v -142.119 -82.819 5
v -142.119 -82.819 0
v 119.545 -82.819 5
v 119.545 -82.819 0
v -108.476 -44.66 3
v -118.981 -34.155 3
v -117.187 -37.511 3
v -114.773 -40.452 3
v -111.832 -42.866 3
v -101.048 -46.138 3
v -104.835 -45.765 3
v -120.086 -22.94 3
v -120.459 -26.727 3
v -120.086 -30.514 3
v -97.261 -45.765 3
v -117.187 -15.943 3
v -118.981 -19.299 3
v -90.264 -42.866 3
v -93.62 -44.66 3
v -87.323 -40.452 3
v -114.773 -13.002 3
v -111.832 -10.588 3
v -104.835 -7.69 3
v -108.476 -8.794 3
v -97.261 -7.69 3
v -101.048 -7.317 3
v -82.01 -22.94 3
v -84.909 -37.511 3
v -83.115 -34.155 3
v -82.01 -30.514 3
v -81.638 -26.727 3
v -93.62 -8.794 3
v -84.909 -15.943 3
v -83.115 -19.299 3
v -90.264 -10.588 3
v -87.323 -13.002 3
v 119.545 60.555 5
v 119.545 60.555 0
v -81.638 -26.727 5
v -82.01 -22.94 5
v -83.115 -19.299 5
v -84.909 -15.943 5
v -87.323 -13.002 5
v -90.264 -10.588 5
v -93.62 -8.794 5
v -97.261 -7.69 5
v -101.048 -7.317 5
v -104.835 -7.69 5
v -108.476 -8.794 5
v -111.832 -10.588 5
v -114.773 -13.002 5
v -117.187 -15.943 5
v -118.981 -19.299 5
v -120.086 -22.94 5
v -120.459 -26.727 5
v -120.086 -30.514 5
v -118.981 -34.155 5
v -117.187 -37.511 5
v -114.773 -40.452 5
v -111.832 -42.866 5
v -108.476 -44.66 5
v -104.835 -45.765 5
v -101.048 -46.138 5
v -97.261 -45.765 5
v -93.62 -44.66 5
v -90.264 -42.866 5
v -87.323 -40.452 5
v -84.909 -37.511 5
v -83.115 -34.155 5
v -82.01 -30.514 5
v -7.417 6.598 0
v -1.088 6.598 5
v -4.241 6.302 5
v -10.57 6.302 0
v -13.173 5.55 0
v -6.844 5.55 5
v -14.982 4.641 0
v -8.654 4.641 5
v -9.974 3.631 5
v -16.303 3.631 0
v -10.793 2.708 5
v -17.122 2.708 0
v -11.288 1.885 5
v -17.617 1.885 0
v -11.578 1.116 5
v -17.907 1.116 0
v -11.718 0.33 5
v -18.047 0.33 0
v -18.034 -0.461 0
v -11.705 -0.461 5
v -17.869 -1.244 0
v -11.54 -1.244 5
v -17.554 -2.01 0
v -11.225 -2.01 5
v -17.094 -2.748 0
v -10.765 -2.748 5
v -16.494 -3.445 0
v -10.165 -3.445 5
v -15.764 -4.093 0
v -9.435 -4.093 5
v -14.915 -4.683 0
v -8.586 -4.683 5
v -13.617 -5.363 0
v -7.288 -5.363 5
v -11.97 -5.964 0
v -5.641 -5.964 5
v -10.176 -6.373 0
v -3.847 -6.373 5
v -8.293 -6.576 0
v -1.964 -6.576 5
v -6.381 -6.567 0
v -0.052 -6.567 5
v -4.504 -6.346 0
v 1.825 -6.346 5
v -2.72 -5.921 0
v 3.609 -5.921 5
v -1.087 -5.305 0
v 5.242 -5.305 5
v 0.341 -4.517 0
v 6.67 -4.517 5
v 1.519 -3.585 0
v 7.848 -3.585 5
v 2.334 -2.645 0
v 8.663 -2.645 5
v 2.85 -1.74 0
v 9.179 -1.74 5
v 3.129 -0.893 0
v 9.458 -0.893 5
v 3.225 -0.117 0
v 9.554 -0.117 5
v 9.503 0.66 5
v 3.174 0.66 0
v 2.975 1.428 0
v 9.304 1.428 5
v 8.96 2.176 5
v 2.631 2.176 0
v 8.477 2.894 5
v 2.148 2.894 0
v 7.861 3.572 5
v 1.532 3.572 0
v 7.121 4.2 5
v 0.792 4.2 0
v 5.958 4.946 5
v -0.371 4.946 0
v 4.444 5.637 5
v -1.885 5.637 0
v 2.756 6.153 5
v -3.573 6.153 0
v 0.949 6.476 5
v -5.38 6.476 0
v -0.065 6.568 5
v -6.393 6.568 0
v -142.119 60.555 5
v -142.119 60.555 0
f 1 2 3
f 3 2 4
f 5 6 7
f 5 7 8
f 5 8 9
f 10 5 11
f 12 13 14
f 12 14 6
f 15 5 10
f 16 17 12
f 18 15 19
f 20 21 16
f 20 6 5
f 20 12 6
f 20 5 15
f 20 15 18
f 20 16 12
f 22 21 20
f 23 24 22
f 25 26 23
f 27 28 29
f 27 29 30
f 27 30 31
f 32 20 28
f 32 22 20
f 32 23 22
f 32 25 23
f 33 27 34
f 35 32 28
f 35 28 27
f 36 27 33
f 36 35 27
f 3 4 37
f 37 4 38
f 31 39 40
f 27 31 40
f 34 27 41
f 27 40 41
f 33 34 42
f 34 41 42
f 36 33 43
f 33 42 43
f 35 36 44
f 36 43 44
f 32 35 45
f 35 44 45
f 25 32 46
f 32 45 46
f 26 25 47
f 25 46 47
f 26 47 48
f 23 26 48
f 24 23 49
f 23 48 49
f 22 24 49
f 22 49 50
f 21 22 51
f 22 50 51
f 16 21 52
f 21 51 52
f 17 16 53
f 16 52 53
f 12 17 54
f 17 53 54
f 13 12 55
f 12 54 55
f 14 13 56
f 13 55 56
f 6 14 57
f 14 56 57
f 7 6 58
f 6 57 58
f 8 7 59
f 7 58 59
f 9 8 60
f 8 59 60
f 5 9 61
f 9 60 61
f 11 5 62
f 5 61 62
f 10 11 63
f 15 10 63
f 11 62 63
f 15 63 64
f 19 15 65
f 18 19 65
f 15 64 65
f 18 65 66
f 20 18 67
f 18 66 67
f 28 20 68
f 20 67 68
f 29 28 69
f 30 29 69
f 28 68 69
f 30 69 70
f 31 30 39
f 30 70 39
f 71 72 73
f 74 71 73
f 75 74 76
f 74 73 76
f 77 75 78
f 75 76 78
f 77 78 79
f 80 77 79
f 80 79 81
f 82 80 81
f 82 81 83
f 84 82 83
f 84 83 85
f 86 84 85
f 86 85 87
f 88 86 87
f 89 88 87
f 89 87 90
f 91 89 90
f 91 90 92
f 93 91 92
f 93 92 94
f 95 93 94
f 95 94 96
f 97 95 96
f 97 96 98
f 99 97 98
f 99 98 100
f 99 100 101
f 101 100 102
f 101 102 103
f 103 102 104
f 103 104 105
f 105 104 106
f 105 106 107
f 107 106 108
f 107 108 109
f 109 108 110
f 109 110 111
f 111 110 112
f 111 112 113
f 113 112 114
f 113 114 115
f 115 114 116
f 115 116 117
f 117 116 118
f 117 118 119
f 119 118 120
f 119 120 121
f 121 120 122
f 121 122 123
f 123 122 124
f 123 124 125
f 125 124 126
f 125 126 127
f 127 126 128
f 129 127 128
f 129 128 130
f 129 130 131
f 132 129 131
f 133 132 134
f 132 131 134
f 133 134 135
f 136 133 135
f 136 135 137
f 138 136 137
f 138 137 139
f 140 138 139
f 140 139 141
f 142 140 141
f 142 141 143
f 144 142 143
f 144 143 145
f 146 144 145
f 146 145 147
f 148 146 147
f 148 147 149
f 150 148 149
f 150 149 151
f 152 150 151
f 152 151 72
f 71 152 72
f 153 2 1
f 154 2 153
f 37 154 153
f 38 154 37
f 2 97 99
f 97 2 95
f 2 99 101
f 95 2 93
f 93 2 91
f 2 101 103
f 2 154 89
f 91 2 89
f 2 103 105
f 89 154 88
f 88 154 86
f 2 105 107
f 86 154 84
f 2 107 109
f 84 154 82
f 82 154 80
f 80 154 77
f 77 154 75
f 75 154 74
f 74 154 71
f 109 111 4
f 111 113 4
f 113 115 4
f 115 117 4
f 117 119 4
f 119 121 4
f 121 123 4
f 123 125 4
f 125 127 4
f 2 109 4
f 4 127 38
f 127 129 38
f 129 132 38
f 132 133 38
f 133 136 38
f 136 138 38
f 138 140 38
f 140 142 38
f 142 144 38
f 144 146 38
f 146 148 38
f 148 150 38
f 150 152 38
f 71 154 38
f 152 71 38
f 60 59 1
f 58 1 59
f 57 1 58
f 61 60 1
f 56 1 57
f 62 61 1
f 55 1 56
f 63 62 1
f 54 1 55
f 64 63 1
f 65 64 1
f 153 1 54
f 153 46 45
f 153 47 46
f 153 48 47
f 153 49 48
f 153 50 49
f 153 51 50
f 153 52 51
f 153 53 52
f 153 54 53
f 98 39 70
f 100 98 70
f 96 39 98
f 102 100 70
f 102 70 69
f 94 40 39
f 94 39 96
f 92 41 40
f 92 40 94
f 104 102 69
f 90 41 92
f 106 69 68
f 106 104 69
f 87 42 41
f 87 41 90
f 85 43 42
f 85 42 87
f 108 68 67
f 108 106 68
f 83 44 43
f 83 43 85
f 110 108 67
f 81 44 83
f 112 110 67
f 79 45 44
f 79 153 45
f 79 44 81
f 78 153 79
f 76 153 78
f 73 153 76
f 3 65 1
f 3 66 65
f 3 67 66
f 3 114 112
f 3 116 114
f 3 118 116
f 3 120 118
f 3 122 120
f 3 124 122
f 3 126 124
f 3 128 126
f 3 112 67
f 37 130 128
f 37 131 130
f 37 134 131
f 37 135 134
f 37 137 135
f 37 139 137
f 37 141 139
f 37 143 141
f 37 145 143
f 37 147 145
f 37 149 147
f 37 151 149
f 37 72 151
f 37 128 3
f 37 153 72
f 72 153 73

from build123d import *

# Parameters (mm, degrees)
F0_W     = 261.6643384099
F0_H     = 143.3737166226
F1_DEPTH = 5
F2_R     = 19.4105187662
F3_DEPTH = 2
F6_R     = 6.5980928428
F7_DEPTH = 96.0488122602


# Not quite as in the source:
# - a feature of the source that left no trace in its solid (it failed there, or was rolled back) is left out


with BuildPart() as f1:
    # F0 (on Top) → F1 (new body)
    with BuildSketch(Plane.XY):
        with Locations((-11.2871490419, -11.1323576421)):
            Rectangle(F0_W, F0_H)
    extrude(amount=F1_DEPTH)

    # F2 (on face) → F3 (cut)
    with BuildSketch(Plane.XY.offset(5)):
        with Locations((-101.0480299592, -26.7270803452)):
            Circle(F2_R)
    extrude(amount=-F3_DEPTH, mode=Mode.SUBTRACT)


with BuildPart() as f7:
    # F6 (on line) → F7 (new body, through all)
    with BuildSketch(Plane(origin=(41.3091172937, 0, 32.6350144213), x_dir=(0, 1, 0), z_dir=(0.7846743667, 0, 0.6199081692))):
        with Locations((0, 4.5975914841)):
            Circle(F6_R)
    extrude(amount=-F7_DEPTH)


with BuildPart() as f1_1:
    add(f1.part)

    # F8: cut F7
    add(f7.part, mode=Mode.SUBTRACT)


solid = f1_1.part
